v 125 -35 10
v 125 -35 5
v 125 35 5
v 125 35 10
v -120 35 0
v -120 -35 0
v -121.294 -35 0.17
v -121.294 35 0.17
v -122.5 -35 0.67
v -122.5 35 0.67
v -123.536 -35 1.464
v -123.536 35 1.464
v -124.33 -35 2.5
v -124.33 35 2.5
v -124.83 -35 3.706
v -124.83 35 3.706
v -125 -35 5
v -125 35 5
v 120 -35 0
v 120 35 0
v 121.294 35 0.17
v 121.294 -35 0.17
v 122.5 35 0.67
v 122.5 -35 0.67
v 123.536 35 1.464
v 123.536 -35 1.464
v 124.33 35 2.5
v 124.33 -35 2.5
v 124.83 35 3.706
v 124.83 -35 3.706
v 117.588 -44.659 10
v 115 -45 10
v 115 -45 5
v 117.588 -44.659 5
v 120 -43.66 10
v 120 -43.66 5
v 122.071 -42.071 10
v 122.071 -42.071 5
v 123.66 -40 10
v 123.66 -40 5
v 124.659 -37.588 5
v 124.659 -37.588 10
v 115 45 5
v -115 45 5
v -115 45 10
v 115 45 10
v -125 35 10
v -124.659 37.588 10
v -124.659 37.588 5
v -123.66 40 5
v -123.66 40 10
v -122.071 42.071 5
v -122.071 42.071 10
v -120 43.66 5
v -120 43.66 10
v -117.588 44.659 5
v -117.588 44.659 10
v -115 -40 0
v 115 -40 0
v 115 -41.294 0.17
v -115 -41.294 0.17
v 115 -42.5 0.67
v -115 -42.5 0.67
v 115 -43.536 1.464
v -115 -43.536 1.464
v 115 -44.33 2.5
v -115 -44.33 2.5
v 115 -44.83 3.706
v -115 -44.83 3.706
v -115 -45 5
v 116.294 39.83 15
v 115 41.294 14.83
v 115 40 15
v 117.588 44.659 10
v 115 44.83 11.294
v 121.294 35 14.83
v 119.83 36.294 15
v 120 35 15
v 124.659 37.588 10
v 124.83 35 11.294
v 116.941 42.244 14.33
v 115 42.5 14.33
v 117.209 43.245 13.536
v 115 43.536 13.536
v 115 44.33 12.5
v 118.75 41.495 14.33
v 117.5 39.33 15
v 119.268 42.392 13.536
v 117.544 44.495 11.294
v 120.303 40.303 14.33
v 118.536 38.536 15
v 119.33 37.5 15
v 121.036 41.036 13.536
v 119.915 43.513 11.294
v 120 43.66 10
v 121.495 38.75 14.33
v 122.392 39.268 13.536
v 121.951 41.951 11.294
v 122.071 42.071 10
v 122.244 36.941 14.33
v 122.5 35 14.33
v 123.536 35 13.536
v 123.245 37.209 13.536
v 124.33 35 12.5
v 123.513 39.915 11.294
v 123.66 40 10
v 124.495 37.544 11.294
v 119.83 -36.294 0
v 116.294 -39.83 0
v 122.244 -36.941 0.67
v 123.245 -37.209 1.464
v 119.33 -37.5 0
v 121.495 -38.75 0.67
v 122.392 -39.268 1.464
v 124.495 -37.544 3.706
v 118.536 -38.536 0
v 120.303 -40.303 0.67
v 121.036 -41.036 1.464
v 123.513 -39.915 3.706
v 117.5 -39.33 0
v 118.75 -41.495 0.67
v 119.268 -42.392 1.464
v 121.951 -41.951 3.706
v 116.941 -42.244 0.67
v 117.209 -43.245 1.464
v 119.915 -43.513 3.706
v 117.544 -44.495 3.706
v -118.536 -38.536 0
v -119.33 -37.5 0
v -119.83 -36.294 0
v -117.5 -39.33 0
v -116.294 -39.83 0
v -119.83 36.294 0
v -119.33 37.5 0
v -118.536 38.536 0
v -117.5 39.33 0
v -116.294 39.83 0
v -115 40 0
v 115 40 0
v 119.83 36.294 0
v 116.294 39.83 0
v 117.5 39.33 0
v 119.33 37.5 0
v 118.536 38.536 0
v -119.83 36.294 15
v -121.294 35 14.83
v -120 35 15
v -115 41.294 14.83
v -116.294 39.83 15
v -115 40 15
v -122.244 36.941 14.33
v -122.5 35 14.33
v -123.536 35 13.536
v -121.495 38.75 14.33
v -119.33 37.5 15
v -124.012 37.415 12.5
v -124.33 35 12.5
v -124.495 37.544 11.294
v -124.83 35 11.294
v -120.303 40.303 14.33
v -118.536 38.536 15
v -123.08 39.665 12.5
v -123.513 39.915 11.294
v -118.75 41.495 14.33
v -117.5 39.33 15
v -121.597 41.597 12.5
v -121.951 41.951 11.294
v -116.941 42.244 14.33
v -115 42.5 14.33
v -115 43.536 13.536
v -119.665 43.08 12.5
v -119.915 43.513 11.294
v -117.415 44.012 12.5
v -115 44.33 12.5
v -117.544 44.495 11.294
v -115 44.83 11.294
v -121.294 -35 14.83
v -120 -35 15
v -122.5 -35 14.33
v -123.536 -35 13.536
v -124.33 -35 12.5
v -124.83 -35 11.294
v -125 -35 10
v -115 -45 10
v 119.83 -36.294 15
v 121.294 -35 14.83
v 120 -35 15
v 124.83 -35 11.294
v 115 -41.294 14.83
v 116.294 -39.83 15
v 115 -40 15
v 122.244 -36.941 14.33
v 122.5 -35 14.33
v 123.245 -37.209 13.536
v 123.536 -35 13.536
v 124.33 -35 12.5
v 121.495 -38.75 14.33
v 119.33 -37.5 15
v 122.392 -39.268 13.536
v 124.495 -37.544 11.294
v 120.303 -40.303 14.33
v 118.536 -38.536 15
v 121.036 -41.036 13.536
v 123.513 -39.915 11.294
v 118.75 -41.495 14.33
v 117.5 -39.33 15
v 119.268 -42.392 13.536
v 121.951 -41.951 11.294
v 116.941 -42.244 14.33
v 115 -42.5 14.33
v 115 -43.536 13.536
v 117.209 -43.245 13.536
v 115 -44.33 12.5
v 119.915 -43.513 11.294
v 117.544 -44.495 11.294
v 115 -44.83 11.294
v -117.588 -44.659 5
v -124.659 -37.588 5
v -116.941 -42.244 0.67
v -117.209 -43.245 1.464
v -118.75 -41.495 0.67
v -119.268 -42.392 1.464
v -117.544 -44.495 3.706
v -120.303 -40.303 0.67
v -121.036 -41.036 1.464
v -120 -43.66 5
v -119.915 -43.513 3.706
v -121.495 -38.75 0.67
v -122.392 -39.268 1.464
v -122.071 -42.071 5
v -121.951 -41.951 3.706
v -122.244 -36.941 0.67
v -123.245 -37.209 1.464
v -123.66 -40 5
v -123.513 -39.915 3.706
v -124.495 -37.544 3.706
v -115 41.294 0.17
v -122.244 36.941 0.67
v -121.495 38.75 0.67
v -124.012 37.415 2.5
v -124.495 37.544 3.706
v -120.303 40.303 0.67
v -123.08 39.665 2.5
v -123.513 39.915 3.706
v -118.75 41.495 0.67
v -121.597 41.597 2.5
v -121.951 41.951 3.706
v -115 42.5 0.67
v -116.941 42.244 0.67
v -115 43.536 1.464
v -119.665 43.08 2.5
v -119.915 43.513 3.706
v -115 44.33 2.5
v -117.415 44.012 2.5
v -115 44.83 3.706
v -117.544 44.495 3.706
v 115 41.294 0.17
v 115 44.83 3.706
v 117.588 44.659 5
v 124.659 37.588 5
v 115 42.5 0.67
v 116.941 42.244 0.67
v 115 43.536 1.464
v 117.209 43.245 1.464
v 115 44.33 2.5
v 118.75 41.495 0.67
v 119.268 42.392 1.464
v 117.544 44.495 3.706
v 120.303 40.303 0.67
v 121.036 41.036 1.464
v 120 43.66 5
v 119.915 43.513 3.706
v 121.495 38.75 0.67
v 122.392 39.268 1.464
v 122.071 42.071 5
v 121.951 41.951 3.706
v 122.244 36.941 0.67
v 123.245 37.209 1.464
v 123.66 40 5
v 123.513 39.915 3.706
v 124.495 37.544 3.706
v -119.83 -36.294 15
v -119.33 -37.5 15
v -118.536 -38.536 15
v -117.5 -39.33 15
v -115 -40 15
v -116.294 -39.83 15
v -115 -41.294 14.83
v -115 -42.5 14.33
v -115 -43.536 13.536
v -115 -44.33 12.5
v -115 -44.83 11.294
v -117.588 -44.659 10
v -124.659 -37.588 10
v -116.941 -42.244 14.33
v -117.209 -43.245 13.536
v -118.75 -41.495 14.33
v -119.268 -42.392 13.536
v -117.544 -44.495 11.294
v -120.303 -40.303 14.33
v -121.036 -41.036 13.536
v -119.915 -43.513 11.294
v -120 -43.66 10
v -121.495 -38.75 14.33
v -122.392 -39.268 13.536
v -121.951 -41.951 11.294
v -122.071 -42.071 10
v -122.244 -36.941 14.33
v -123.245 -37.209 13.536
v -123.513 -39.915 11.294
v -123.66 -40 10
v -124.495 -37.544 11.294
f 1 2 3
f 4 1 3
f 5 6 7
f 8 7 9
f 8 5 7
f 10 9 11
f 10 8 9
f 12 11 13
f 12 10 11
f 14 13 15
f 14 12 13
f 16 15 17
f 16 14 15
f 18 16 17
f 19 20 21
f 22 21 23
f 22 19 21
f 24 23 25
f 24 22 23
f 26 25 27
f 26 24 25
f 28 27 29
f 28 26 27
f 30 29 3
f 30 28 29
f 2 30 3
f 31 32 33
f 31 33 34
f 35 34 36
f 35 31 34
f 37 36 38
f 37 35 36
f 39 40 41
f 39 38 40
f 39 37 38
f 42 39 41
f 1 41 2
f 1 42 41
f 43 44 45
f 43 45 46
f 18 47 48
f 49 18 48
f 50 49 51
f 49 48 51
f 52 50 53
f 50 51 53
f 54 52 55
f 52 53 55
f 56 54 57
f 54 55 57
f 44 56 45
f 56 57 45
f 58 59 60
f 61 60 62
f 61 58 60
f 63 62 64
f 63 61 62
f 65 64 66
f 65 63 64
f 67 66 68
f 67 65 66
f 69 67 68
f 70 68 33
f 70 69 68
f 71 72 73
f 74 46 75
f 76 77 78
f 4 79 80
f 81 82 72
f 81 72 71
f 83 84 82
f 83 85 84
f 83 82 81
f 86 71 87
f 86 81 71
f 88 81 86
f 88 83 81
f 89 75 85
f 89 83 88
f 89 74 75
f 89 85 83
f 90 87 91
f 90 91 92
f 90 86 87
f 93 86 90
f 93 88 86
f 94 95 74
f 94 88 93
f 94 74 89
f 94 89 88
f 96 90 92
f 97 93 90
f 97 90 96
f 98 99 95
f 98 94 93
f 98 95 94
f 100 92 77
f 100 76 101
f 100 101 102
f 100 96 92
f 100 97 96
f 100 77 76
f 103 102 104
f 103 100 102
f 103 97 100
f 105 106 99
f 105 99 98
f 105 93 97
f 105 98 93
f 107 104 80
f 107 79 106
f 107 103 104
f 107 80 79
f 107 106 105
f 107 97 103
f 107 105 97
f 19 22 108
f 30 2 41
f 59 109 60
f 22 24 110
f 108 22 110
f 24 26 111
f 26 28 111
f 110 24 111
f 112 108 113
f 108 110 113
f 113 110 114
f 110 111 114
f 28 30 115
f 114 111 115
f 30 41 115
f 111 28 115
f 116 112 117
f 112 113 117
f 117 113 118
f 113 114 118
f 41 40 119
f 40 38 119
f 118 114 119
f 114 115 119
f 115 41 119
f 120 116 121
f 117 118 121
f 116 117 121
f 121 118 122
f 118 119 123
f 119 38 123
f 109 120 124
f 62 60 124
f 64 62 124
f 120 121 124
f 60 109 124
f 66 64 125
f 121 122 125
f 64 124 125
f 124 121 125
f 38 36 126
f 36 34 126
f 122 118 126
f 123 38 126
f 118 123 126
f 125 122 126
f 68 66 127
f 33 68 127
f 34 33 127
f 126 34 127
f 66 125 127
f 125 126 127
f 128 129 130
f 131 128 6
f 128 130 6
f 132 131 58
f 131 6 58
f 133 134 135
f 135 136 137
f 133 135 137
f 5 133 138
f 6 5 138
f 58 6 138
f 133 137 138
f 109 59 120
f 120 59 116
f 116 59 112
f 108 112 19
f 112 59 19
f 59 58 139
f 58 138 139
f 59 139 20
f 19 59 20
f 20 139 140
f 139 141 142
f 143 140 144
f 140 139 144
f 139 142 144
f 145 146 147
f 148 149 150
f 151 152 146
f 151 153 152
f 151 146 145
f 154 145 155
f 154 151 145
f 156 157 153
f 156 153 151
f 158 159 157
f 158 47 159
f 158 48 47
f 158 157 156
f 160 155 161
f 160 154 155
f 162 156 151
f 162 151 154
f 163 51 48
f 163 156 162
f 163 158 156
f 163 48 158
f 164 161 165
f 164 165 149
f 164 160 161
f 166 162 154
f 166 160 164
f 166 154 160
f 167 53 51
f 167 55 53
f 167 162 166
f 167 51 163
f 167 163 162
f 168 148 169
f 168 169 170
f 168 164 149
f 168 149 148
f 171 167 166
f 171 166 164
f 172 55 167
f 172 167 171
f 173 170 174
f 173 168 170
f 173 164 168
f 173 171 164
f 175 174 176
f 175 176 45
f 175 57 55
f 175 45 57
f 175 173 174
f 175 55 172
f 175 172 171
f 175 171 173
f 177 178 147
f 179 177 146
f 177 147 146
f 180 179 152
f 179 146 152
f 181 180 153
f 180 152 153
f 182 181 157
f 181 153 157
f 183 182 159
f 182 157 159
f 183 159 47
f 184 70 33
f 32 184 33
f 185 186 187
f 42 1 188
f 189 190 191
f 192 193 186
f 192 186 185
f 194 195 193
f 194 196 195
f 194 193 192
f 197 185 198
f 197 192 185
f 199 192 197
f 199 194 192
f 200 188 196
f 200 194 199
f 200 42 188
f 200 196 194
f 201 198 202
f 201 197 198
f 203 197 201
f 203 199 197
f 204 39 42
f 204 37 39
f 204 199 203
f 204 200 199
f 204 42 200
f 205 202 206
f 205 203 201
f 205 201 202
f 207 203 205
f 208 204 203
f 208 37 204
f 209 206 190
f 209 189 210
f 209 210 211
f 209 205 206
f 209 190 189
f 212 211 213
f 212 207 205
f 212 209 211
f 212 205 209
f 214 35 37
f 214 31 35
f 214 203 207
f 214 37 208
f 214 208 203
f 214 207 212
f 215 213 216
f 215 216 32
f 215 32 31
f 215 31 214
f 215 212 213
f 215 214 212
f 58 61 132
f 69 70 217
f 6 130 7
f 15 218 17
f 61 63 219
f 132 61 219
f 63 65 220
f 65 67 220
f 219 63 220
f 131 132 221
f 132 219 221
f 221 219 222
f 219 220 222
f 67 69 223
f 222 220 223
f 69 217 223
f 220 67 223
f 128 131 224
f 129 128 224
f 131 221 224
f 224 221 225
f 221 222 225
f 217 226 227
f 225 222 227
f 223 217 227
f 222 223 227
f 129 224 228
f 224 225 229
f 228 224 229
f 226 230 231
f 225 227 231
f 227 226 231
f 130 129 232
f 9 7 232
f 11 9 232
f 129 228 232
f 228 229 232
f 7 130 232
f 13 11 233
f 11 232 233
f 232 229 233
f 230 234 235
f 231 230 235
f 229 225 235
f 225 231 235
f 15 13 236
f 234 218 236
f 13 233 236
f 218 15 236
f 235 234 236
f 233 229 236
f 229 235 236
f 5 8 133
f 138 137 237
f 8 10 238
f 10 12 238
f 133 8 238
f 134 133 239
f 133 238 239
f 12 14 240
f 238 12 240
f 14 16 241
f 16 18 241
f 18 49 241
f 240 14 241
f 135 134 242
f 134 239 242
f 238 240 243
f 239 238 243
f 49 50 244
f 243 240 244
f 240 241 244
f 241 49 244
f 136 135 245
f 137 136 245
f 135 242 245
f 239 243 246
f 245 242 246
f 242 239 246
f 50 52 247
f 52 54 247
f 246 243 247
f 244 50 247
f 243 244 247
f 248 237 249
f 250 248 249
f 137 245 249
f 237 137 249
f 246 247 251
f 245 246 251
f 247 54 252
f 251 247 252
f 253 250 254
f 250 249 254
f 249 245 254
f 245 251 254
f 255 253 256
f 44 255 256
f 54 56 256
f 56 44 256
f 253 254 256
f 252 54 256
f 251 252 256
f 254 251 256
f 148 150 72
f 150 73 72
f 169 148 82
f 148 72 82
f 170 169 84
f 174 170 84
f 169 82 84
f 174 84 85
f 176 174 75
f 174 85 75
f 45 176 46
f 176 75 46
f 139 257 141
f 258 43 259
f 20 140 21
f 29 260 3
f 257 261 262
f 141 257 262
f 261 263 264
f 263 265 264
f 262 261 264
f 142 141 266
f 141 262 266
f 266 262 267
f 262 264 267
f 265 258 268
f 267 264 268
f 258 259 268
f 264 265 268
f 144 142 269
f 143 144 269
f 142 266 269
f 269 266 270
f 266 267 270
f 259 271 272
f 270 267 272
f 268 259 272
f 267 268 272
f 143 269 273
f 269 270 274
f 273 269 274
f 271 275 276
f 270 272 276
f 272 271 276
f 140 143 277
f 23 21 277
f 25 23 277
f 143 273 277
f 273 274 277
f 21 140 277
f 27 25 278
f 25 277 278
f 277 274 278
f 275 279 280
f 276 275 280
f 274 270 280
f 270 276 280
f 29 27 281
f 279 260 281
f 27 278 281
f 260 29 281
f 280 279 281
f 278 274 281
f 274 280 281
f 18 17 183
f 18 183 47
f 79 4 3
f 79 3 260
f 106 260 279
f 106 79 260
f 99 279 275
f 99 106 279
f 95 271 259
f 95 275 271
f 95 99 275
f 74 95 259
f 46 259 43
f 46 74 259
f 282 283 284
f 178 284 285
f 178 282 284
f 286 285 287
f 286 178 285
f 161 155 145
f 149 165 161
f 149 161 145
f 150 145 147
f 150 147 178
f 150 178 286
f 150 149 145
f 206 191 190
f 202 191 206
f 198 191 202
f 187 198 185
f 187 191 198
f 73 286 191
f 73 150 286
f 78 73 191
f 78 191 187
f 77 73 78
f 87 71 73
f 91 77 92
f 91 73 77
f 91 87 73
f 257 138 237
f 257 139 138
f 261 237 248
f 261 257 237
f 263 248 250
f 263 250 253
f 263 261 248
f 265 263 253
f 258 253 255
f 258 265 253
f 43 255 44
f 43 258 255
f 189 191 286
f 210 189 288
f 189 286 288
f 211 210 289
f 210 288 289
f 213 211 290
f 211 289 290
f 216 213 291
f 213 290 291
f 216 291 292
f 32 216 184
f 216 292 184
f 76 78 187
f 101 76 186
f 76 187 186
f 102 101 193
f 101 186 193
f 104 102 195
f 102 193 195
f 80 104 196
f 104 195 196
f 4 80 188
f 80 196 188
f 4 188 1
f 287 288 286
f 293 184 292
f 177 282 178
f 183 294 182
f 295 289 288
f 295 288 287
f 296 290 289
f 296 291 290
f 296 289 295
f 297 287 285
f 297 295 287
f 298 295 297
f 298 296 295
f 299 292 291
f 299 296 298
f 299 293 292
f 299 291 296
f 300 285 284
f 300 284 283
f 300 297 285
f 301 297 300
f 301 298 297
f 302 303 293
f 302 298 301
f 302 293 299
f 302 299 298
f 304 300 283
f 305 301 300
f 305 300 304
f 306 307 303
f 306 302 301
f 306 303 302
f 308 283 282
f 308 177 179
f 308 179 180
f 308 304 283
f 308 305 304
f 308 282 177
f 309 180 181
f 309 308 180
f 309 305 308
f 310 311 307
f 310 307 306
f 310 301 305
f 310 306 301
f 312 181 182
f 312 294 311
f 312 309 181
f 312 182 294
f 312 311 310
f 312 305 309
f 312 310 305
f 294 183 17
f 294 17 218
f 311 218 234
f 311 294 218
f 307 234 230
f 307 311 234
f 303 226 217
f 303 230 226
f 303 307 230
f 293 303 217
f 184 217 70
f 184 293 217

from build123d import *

# Parameters (mm, degrees)
SKETCH1_W           = 250
SKETCH1_H           = 90
BOSS_EXTRUDE1_DEPTH = 15
FILLET1_R           = 10
FILLET2_R           = 5


with BuildPart() as part:
    # Sketch1 → Boss-Extrude1 (new body)
    with BuildSketch(Plane.XY):
        Rectangle(SKETCH1_W, SKETCH1_H)
    extrude(amount=BOSS_EXTRUDE1_DEPTH)

    # Fillet1
    fillet1_edges = [part.edges().sort_by_distance(p)[0] for p in [
        (125, -45, 7.5),
        (-125, -45, 7.5),
        (-125, 45, 7.5),
        (125, 45, 7.5),
    ]]
    fillet(fillet1_edges, radius=FILLET1_R)

    # Fillet2
    fillet2_edges = [part.edges().sort_by_distance(p)[0] for p in [
        (0, 45, 0),
        (0, 45, 15),
        (125, 0, 0),
        (0, -45, 0),
        (-125, 0, 0),
        (-122.071067812, 42.071067812, 0),
        (-122.071067812, -42.071067812, 0),
        (122.071067812, -42.071067812, 0),
        (122.071067812, 42.071067812, 0),
        (125, 0, 15),
        (-125, 0, 15),
        (0, -45, 15),
        (-122.071067812, 42.071067812, 15),
        (-122.071067812, -42.071067812, 15),
        (122.071067812, -42.071067812, 15),
        (122.071067812, 42.071067812, 15),
    ]]
    fillet(fillet2_edges, radius=FILLET2_R)


solid = part.part
